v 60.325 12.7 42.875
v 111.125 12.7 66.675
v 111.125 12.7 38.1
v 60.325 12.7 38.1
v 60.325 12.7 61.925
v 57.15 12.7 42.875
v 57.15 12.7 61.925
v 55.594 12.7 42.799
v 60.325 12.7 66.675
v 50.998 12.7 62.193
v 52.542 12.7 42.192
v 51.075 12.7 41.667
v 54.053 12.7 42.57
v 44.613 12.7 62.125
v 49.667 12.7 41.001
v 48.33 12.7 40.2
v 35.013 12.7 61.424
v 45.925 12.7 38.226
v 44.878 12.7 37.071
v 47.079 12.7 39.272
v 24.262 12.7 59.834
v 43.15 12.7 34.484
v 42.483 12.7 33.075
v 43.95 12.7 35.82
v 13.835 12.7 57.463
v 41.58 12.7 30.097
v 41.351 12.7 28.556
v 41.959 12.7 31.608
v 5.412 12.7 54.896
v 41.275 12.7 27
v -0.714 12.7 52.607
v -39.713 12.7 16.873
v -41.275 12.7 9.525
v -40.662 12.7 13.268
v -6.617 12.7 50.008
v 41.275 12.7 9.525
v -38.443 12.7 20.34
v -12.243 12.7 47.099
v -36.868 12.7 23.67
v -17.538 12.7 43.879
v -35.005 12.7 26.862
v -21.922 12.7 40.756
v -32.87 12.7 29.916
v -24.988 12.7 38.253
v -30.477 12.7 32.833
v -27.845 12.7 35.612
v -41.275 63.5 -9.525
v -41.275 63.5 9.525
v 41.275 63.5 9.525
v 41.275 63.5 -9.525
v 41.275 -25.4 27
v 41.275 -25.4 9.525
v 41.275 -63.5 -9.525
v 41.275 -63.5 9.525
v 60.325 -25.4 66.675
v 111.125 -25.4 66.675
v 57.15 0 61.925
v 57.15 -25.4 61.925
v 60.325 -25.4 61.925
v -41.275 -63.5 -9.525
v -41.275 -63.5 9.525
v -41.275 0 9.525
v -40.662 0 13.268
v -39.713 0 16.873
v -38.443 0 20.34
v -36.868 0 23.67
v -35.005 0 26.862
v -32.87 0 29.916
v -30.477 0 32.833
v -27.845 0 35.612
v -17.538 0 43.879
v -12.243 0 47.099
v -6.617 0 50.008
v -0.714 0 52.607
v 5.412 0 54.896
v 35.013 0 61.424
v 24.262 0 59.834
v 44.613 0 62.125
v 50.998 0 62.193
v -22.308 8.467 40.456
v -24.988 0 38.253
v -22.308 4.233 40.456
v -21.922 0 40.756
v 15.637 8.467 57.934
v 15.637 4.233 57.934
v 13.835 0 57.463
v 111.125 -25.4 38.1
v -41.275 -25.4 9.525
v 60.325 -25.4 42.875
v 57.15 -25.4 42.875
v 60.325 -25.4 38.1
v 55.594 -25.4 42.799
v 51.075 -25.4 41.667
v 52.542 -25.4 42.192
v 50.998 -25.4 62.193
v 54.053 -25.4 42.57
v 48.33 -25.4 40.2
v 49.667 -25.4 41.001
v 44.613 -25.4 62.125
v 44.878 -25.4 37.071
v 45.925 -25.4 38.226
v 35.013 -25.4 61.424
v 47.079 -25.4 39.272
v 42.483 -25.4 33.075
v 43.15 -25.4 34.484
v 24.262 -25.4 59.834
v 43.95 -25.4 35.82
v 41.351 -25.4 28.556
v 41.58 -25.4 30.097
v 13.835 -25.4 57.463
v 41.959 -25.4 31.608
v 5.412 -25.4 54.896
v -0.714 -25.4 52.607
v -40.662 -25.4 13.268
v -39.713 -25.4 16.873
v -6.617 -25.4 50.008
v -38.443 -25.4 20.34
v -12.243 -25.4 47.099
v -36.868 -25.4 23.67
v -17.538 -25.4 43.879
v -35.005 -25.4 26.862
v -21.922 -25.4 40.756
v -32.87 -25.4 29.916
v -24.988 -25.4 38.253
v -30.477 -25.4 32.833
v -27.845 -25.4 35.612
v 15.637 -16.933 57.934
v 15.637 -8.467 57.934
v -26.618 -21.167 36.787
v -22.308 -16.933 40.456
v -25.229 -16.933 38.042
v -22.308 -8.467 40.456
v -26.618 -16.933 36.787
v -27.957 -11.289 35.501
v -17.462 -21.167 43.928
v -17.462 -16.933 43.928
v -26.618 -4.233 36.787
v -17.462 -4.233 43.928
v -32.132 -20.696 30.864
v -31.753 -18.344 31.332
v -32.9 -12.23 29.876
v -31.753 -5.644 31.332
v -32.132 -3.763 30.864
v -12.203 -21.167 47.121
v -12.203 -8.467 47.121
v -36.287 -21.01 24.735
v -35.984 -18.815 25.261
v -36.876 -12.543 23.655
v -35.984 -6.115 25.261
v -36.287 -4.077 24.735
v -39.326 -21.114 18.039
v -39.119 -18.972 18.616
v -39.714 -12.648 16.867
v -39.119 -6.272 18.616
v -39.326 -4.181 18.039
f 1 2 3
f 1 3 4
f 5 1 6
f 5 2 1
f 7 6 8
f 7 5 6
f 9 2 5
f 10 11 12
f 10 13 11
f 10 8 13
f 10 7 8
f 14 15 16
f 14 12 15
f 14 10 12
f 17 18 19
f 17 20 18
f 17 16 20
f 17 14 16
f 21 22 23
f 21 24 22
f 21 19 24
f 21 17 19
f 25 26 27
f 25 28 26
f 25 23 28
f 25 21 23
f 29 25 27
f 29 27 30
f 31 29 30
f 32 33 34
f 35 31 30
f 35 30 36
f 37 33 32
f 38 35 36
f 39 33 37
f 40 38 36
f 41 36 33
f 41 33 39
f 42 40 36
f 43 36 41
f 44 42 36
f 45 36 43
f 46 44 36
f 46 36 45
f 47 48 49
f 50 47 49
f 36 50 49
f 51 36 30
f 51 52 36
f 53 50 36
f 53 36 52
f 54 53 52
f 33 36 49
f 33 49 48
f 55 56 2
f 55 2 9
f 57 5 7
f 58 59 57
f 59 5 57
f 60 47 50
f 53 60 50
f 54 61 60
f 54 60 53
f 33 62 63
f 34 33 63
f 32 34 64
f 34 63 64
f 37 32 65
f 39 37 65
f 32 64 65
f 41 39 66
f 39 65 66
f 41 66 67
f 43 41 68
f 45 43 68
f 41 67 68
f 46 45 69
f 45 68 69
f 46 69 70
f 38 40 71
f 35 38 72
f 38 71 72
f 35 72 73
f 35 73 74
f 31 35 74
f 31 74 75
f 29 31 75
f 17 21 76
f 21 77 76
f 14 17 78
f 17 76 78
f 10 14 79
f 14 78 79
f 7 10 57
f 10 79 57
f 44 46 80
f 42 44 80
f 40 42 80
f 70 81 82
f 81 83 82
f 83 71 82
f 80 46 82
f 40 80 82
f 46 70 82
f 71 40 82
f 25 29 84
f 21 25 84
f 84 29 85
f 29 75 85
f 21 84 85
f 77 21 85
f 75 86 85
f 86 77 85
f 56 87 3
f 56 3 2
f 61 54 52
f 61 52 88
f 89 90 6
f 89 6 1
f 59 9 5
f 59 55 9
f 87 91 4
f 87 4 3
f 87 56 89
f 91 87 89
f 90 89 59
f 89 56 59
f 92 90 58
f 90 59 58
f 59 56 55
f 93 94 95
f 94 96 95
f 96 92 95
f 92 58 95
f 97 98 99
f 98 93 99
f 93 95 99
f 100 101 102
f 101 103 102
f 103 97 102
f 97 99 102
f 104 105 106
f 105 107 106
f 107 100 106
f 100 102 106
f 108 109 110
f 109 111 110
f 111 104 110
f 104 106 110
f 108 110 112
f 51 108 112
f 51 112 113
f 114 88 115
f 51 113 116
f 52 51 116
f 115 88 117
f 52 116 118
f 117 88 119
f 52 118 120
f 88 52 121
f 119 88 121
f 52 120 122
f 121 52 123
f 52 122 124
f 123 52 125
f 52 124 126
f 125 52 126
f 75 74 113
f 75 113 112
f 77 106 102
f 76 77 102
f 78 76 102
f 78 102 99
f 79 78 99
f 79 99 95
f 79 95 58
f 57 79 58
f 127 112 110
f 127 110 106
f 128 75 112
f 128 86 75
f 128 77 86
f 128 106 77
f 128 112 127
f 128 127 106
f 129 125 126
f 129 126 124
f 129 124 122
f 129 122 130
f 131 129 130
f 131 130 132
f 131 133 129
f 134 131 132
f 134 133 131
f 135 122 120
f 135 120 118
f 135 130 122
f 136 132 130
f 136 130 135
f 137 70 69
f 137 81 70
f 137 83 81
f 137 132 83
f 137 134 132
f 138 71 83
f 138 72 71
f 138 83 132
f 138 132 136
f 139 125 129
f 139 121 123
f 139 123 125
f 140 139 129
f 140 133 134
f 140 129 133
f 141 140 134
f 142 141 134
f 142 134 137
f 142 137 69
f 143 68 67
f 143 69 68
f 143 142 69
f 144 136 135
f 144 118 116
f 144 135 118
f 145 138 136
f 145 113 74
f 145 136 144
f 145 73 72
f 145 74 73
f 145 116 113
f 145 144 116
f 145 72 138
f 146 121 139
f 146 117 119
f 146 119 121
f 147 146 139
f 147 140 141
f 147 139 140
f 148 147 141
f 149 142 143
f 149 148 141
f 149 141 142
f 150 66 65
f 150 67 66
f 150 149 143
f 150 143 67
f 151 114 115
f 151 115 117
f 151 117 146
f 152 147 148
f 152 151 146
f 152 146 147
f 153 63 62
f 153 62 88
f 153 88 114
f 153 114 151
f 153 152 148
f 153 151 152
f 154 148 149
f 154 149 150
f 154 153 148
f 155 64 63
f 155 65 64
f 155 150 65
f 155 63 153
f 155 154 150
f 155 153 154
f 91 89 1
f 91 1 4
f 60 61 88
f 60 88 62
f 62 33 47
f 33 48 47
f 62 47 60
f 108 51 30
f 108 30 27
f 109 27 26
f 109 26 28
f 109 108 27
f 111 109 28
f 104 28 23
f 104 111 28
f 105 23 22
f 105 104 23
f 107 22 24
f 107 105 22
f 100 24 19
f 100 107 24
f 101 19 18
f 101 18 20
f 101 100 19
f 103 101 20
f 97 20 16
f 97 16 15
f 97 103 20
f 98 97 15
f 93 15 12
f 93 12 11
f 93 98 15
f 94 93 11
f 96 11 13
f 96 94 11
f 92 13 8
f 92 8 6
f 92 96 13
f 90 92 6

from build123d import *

# Parameters (mm, degrees)
F1_DEPTH = 63.5
F2_DEPTH = 25.4
F3_DEPTH = 12.7


with BuildPart() as f1:
    # F0 (on Front) → F1 (new body, symmetric)
    with BuildSketch(Plane.XZ):
        Polygon((22.225, 9.525), (-41.275, 9.525), (-41.275, -9.525), (41.275, -9.525), (41.275, 9.525), align=None)
    extrude(amount=F1_DEPTH, both=True)

    # F0 (on Front) → F2 (join)
    with BuildSketch(Plane.XZ):
        with BuildLine():
            add(Edge.make_bspline(
                [(-41.275, 9.525), (-36.934671, 47.172504), (18.990146, 64.688085), (57.15, 61.9252)],
                knots=[0, 0, 0, 0, 111.504536, 111.504536, 111.504536, 111.504536], degree=3))
            Line((-41.275, 9.525), (22.225, 9.525))
            Line((22.225, 9.525), (22.225, 27.0002))
            ThreePointArc((22.225, 27.0002), (32.454296, 51.695904), (57.15, 61.9252))
        make_face()
        Polygon((22.225, 9.525), (-41.275, 9.525), (-41.275, -9.525), (41.275, -9.525), (41.275, 9.525), align=None)
        with BuildLine():
            Line((22.225, 27.0002), (22.225, 9.525))
            Line((22.225, 9.525), (41.275, 9.525))
            Line((41.275, 9.525), (41.275, 27.0002))
            ThreePointArc((41.275, 27.0002), (45.92468, 38.22552), (57.15, 42.8752))
            Line((57.15, 42.8752), (60.325, 42.8752))
            Line((60.325, 42.8752), (60.325, 61.9252))
            Line((60.325, 61.9252), (57.15, 61.9252))
            ThreePointArc((57.15, 61.9252), (32.454296, 51.695904), (22.225, 27.0002))
        make_face()
        Polygon((60.325, 66.675), (60.325, 61.9252), (60.325, 42.8752), (60.325, 38.1), (111.125, 38.1), (111.125, 66.675), align=None)
    extrude(amount=F2_DEPTH)

    # F0 (on Front) → F3 (join, symmetric)
    with BuildSketch(Plane.XZ):
        with BuildLine():
            add(Edge.make_bspline(
                [(-41.275, 9.525), (-36.934671, 47.172504), (18.990146, 64.688085), (57.15, 61.9252)],
                knots=[0, 0, 0, 0, 111.504536, 111.504536, 111.504536, 111.504536], degree=3))
            Line((-41.275, 9.525), (22.225, 9.525))
            Line((22.225, 9.525), (22.225, 27.0002))
            ThreePointArc((22.225, 27.0002), (32.454296, 51.695904), (57.15, 61.9252))
        make_face()
        Polygon((22.225, 9.525), (-41.275, 9.525), (-41.275, -9.525), (41.275, -9.525), (41.275, 9.525), align=None)
        with BuildLine():
            Line((22.225, 27.0002), (22.225, 9.525))
            Line((22.225, 9.525), (41.275, 9.525))
            Line((41.275, 9.525), (41.275, 27.0002))
            ThreePointArc((41.275, 27.0002), (45.92468, 38.22552), (57.15, 42.8752))
            Line((57.15, 42.8752), (60.325, 42.8752))
            Line((60.325, 42.8752), (60.325, 61.9252))
            Line((60.325, 61.9252), (57.15, 61.9252))
            ThreePointArc((57.15, 61.9252), (32.454296, 51.695904), (22.225, 27.0002))
        make_face()
        Polygon((60.325, 66.675), (60.325, 61.9252), (60.325, 42.8752), (60.325, 38.1), (111.125, 38.1), (111.125, 66.675), align=None)
    extrude(amount=F3_DEPTH, both=True)


solid = f1.part
